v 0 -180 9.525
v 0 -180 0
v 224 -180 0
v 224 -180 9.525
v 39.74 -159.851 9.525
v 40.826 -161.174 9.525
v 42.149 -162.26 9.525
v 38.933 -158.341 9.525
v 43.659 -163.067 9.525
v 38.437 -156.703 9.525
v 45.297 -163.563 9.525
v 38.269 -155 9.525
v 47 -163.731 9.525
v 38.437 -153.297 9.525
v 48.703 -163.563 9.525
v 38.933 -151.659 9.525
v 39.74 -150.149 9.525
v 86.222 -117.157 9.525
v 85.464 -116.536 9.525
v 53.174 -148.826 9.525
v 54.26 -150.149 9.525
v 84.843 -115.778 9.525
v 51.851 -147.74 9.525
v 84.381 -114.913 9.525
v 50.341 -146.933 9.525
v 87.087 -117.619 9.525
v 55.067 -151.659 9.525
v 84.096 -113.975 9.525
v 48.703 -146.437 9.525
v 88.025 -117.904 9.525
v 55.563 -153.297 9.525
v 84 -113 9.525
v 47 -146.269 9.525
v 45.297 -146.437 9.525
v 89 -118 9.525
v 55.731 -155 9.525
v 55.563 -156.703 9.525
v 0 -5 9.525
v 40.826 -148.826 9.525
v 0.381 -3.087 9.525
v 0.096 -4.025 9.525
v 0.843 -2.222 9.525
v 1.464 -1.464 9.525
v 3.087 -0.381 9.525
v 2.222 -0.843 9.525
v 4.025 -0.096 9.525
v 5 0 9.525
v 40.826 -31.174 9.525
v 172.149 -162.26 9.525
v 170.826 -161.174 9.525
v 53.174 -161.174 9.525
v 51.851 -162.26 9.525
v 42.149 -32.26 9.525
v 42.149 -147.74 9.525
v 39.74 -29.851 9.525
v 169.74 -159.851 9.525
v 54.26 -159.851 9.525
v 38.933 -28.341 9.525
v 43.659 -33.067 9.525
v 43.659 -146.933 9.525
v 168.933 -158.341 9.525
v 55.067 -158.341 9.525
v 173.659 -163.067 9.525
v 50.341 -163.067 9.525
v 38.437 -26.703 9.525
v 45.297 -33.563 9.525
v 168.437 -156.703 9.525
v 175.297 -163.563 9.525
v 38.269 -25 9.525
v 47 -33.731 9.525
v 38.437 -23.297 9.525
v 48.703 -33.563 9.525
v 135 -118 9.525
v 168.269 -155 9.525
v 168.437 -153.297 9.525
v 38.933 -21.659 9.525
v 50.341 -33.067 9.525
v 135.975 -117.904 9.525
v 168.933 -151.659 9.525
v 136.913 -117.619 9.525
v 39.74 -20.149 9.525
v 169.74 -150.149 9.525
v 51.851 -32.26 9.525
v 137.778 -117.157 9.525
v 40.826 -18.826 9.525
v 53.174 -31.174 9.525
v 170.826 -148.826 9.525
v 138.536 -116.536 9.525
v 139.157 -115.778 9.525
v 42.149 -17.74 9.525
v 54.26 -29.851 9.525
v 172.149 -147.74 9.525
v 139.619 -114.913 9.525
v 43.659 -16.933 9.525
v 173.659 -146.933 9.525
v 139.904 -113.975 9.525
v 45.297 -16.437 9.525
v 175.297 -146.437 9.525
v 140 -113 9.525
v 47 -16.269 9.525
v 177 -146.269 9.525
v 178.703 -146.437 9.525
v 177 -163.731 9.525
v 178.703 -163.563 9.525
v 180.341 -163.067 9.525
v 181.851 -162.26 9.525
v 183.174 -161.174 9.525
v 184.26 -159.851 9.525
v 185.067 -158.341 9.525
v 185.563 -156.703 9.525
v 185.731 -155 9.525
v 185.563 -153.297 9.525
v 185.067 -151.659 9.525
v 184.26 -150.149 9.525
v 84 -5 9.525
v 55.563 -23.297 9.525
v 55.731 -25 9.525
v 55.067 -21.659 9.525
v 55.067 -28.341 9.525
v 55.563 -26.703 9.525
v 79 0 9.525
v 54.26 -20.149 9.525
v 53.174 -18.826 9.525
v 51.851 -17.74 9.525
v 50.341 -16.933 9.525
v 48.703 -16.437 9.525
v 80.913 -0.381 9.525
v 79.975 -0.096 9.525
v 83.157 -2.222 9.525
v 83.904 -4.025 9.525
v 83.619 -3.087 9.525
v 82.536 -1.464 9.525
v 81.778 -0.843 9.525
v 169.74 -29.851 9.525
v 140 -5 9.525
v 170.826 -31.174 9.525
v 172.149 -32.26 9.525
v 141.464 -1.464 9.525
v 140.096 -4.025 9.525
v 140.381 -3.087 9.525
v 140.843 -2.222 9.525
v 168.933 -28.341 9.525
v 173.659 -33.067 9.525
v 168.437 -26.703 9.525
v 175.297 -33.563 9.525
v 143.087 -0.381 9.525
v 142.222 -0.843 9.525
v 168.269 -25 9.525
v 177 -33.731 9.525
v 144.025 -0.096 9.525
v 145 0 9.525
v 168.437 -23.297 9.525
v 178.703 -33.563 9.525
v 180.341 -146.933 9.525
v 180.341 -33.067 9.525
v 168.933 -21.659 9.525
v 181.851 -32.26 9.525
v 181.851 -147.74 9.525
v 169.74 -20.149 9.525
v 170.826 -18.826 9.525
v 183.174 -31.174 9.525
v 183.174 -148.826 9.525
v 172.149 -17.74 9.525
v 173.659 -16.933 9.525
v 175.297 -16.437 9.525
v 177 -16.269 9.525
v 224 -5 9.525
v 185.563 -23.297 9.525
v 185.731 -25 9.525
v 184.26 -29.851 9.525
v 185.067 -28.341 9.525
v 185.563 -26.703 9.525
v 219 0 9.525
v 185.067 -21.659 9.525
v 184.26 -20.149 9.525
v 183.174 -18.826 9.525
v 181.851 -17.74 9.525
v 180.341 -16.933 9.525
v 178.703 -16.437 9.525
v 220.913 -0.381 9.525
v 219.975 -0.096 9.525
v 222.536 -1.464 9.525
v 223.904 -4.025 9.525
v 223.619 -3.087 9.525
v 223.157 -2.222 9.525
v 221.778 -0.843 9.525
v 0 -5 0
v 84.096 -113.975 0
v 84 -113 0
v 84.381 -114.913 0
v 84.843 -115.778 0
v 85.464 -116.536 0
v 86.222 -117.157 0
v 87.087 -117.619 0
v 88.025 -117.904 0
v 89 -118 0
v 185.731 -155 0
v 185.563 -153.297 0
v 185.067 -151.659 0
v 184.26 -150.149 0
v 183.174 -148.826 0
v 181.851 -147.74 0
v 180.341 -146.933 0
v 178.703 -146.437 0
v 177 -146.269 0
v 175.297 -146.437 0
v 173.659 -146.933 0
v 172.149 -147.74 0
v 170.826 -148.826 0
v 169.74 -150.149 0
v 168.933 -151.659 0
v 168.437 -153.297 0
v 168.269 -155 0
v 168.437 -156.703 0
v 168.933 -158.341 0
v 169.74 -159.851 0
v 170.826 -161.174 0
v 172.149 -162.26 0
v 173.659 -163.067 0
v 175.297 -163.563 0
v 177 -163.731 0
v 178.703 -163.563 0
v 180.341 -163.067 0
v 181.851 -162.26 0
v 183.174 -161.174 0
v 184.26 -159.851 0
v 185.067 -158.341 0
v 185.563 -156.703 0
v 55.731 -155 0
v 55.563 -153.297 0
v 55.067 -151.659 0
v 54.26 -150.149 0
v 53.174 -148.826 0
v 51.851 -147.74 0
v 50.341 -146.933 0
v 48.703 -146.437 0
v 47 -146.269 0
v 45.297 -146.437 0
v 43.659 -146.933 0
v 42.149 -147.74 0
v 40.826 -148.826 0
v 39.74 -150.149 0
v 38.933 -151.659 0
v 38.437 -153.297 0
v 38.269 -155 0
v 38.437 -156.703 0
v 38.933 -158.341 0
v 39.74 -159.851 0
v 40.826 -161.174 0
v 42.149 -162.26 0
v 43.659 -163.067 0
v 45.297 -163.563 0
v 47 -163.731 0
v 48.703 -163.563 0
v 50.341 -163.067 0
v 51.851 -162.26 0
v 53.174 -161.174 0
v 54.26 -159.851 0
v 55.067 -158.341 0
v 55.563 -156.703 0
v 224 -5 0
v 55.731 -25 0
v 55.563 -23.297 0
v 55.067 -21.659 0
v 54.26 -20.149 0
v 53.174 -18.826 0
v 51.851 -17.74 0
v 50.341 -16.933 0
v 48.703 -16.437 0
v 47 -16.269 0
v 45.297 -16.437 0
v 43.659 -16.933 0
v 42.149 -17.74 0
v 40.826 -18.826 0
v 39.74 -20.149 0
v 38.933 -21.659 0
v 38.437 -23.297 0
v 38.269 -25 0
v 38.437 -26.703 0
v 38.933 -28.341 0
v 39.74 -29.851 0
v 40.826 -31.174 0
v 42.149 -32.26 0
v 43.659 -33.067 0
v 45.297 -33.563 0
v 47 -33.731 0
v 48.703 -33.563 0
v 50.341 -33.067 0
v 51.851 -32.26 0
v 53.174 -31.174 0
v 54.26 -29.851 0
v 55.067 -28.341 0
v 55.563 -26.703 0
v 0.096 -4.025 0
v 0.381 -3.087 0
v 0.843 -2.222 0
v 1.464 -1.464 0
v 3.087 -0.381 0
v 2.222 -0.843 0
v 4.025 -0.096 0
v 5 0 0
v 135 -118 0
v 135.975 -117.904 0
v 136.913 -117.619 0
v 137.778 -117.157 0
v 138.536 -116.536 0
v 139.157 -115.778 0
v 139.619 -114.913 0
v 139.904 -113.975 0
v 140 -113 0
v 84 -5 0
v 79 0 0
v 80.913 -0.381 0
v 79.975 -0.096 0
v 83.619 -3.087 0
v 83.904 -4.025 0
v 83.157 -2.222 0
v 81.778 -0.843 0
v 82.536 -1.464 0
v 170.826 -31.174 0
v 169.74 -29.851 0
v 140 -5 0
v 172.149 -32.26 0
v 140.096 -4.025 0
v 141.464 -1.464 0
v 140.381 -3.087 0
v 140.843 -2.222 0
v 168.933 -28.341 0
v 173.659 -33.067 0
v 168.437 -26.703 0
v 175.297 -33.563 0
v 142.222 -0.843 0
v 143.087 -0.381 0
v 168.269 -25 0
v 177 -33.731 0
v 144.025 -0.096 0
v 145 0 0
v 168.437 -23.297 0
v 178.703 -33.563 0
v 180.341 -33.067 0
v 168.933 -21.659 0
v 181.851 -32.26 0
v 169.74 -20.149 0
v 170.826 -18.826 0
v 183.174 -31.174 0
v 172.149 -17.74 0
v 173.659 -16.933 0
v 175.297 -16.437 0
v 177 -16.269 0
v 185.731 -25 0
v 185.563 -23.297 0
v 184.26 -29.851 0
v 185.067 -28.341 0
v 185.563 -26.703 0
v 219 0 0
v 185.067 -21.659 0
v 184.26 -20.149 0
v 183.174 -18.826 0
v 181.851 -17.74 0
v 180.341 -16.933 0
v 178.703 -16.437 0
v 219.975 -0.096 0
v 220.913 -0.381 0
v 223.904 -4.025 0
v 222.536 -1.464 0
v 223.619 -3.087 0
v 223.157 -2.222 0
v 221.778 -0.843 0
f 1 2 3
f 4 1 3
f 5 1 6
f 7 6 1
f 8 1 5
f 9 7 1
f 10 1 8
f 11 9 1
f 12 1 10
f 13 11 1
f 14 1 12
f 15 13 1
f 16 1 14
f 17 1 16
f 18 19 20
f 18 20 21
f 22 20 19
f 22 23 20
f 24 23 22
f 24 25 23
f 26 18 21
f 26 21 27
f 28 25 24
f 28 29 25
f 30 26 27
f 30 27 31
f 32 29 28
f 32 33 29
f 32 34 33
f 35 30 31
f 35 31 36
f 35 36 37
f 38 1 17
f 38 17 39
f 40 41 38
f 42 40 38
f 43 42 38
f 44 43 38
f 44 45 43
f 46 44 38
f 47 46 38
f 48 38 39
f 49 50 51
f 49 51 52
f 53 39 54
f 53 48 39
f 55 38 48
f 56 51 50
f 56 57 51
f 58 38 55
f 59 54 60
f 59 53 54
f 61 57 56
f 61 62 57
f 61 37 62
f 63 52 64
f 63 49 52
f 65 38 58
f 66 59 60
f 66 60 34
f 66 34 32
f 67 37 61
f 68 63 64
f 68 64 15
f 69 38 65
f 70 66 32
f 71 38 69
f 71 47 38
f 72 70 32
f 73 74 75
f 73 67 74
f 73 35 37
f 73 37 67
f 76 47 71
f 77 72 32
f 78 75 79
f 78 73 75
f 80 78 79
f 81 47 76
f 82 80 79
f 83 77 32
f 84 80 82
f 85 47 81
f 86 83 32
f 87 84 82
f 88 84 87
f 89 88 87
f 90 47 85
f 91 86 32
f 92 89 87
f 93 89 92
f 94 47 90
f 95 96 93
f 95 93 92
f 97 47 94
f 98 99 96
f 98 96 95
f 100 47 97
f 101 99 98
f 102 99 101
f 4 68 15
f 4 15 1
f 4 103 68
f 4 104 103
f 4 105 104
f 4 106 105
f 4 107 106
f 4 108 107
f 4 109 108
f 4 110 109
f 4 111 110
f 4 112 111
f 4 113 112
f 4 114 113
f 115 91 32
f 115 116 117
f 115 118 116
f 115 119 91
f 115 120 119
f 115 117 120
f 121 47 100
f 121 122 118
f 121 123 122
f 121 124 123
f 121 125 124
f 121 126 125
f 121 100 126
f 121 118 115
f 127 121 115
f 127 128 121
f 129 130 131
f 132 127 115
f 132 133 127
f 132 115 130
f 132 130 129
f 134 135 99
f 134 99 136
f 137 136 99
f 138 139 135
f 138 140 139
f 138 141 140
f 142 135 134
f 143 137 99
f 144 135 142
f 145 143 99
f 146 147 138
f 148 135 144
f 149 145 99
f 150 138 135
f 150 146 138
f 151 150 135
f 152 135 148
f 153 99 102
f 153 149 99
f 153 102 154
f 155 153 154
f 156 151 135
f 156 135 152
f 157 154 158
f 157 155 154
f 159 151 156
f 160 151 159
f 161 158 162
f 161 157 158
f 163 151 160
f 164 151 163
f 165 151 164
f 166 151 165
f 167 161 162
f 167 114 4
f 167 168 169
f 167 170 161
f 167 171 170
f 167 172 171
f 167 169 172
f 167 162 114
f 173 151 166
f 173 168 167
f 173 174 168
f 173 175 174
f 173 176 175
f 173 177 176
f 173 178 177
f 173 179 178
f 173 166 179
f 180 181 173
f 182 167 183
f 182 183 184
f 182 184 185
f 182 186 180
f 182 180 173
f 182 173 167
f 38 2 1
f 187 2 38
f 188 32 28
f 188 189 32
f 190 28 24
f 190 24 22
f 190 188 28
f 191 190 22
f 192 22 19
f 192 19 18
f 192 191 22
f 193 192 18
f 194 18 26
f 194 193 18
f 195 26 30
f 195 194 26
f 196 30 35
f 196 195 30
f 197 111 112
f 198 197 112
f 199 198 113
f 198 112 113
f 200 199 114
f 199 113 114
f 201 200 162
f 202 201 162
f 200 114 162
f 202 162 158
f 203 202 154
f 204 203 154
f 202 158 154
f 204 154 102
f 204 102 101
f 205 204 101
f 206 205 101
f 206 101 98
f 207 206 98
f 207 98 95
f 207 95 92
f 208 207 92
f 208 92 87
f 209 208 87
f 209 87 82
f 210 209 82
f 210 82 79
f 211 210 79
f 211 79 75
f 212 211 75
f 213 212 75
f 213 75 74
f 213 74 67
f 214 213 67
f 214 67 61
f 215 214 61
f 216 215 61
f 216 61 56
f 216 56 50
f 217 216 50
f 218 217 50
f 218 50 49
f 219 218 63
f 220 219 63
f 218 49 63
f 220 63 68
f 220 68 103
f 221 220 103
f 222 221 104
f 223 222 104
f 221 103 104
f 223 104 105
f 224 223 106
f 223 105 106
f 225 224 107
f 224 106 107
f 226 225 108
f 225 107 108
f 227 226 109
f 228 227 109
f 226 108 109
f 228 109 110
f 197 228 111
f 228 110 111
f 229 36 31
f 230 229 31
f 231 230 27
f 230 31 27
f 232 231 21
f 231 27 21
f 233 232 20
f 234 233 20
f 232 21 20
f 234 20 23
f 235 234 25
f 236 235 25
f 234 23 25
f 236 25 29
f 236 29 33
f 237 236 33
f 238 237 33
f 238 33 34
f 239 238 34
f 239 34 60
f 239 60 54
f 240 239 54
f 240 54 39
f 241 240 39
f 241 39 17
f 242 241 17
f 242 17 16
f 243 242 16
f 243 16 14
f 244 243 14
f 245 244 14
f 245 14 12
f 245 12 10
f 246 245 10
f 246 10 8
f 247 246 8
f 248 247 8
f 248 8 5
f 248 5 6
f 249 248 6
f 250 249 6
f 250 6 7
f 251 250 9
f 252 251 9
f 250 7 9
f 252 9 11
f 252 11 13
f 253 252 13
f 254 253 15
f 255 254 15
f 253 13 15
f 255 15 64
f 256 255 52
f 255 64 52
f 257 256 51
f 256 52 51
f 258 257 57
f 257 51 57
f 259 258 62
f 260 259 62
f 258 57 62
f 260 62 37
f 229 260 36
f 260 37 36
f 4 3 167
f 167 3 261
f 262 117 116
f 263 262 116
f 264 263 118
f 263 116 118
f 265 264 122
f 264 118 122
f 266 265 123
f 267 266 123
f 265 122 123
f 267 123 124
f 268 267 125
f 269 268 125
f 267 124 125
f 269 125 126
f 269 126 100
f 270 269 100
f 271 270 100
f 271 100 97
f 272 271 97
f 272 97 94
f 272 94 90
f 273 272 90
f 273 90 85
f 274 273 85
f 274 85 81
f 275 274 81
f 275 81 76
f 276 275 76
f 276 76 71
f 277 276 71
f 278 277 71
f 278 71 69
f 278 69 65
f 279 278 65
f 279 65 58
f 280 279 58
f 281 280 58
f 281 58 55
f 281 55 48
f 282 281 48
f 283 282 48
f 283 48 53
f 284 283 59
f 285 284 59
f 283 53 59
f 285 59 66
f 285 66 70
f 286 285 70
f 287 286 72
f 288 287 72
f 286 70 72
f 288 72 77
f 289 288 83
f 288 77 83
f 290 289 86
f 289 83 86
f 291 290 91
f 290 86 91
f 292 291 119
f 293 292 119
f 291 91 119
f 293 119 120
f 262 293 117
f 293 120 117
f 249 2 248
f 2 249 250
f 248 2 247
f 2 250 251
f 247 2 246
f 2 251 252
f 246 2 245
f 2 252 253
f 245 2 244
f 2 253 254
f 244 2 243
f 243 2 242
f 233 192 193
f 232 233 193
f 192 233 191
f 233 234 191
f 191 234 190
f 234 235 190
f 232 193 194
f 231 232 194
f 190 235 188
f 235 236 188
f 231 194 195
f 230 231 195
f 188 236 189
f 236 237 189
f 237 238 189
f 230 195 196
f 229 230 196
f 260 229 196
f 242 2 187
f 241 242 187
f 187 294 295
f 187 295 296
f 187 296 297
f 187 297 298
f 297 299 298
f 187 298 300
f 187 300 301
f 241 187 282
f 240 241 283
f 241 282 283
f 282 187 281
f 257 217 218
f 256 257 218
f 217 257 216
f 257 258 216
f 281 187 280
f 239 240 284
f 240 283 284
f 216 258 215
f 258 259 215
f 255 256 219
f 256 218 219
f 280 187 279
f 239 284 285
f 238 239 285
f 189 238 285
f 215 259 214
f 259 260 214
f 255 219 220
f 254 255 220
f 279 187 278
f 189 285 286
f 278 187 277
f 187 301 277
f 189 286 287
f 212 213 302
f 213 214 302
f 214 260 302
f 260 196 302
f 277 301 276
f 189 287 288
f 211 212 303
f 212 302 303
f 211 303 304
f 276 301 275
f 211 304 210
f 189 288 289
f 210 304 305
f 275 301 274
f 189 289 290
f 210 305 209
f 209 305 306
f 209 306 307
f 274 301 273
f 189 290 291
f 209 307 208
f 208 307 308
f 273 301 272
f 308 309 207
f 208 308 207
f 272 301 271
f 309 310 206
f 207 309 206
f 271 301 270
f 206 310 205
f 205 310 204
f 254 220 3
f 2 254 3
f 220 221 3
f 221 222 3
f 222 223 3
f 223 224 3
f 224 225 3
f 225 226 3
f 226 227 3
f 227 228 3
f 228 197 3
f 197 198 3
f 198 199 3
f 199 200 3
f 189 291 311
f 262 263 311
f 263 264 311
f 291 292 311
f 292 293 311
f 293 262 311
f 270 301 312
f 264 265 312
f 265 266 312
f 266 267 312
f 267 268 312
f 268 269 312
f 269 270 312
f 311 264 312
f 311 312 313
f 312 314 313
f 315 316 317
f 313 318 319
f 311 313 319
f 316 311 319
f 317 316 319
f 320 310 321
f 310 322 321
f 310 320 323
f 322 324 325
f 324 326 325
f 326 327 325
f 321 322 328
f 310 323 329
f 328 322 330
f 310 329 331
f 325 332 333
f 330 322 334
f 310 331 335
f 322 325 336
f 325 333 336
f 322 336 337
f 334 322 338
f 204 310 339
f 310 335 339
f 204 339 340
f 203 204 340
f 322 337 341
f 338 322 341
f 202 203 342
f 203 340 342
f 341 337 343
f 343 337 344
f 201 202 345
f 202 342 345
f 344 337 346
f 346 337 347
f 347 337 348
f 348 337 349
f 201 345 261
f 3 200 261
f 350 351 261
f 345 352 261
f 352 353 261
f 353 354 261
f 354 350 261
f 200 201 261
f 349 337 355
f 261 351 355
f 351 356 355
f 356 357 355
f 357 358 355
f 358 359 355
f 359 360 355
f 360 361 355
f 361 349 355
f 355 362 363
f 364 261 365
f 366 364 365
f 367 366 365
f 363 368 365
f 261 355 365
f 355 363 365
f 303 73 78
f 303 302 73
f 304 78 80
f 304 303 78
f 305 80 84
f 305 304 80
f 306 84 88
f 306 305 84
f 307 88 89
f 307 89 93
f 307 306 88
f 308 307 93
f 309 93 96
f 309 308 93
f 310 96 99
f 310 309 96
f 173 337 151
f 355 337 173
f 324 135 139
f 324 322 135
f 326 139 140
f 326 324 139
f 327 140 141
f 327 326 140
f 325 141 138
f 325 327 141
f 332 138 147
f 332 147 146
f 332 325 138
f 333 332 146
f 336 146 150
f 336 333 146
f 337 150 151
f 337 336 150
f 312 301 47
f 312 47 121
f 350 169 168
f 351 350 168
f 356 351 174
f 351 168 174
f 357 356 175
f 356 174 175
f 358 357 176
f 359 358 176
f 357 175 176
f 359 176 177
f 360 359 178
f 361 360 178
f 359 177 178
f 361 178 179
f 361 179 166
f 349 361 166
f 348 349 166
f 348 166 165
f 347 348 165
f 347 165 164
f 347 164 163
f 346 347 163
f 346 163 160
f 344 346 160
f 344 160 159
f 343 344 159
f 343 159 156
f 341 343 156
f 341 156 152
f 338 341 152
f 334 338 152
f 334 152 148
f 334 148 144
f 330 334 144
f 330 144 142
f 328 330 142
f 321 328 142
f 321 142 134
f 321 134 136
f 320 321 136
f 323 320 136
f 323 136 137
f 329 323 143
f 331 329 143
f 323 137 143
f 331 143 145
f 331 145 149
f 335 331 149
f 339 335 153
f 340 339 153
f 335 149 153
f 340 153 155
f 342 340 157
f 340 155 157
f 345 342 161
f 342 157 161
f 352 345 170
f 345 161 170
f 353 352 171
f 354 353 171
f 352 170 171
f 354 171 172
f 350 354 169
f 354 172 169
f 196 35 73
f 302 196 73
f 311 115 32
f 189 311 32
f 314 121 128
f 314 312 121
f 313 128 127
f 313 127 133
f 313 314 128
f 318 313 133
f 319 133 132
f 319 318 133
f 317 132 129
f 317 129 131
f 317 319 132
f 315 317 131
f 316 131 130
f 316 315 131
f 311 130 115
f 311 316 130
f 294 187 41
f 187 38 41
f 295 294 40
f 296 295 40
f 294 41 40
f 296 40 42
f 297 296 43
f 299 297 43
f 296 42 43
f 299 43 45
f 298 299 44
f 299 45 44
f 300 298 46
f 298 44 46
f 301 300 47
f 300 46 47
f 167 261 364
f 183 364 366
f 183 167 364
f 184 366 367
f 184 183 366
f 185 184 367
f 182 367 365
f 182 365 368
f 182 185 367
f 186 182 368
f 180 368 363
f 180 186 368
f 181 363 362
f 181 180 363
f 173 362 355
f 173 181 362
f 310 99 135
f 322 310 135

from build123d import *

# Parameters (mm, degrees)
CROQUIS1_W              = 224
CROQUIS1_H              = 180
SALIENTE_EXTRUIR1_DEPTH = 9.525
CORTAR_EXTRUIR1_DEPTH   = 12.7
REDONDEO1_R             = 5
CROQUIS3_R              = 8.73125
CORTAR_EXTRUIR2_DEPTH   = 13


with BuildPart() as part:
    # Croquis1 → Saliente-Extruir1 (new body)
    with BuildSketch(Plane.XY):
        with Locations((112, -90)):
            Rectangle(CROQUIS1_W, CROQUIS1_H)
    extrude(amount=SALIENTE_EXTRUIR1_DEPTH)

    # Croquis2 → Cortar-Extruir1 (cut)
    with BuildSketch(Plane.XY.offset(9.525)):
        Polygon((84, 0), (84, -118), (140, -118), (140, 0), (112, 0), align=None)
    extrude(amount=-CORTAR_EXTRUIR1_DEPTH, mode=Mode.SUBTRACT)

    # Redondeo1
    redondeo1_edges = [part.edges().sort_by_distance(p)[0] for p in [
        (84, 0, 4.7625),
        (140, 0, 4.7625),
        (140, -118, 4.7625),
        (84, -118, 4.7625),
        (0, 0, 4.7625),
        (224, 0, 4.7625),
    ]]
    fillet(redondeo1_edges, radius=REDONDEO1_R)

    # Croquis3 → Cortar-Extruir2 (cut)
    with BuildSketch(Plane.XY.offset(9.525)):
        with Locations((177, -25)):
            Circle(CROQUIS3_R)
        with Locations((47, -25)):
            Circle(CROQUIS3_R)
        with Locations((47, -155)):
            Circle(CROQUIS3_R)
        with Locations((177, -155)):
            Circle(CROQUIS3_R)
    extrude(amount=-CORTAR_EXTRUIR2_DEPTH, mode=Mode.SUBTRACT)


solid = part.part
